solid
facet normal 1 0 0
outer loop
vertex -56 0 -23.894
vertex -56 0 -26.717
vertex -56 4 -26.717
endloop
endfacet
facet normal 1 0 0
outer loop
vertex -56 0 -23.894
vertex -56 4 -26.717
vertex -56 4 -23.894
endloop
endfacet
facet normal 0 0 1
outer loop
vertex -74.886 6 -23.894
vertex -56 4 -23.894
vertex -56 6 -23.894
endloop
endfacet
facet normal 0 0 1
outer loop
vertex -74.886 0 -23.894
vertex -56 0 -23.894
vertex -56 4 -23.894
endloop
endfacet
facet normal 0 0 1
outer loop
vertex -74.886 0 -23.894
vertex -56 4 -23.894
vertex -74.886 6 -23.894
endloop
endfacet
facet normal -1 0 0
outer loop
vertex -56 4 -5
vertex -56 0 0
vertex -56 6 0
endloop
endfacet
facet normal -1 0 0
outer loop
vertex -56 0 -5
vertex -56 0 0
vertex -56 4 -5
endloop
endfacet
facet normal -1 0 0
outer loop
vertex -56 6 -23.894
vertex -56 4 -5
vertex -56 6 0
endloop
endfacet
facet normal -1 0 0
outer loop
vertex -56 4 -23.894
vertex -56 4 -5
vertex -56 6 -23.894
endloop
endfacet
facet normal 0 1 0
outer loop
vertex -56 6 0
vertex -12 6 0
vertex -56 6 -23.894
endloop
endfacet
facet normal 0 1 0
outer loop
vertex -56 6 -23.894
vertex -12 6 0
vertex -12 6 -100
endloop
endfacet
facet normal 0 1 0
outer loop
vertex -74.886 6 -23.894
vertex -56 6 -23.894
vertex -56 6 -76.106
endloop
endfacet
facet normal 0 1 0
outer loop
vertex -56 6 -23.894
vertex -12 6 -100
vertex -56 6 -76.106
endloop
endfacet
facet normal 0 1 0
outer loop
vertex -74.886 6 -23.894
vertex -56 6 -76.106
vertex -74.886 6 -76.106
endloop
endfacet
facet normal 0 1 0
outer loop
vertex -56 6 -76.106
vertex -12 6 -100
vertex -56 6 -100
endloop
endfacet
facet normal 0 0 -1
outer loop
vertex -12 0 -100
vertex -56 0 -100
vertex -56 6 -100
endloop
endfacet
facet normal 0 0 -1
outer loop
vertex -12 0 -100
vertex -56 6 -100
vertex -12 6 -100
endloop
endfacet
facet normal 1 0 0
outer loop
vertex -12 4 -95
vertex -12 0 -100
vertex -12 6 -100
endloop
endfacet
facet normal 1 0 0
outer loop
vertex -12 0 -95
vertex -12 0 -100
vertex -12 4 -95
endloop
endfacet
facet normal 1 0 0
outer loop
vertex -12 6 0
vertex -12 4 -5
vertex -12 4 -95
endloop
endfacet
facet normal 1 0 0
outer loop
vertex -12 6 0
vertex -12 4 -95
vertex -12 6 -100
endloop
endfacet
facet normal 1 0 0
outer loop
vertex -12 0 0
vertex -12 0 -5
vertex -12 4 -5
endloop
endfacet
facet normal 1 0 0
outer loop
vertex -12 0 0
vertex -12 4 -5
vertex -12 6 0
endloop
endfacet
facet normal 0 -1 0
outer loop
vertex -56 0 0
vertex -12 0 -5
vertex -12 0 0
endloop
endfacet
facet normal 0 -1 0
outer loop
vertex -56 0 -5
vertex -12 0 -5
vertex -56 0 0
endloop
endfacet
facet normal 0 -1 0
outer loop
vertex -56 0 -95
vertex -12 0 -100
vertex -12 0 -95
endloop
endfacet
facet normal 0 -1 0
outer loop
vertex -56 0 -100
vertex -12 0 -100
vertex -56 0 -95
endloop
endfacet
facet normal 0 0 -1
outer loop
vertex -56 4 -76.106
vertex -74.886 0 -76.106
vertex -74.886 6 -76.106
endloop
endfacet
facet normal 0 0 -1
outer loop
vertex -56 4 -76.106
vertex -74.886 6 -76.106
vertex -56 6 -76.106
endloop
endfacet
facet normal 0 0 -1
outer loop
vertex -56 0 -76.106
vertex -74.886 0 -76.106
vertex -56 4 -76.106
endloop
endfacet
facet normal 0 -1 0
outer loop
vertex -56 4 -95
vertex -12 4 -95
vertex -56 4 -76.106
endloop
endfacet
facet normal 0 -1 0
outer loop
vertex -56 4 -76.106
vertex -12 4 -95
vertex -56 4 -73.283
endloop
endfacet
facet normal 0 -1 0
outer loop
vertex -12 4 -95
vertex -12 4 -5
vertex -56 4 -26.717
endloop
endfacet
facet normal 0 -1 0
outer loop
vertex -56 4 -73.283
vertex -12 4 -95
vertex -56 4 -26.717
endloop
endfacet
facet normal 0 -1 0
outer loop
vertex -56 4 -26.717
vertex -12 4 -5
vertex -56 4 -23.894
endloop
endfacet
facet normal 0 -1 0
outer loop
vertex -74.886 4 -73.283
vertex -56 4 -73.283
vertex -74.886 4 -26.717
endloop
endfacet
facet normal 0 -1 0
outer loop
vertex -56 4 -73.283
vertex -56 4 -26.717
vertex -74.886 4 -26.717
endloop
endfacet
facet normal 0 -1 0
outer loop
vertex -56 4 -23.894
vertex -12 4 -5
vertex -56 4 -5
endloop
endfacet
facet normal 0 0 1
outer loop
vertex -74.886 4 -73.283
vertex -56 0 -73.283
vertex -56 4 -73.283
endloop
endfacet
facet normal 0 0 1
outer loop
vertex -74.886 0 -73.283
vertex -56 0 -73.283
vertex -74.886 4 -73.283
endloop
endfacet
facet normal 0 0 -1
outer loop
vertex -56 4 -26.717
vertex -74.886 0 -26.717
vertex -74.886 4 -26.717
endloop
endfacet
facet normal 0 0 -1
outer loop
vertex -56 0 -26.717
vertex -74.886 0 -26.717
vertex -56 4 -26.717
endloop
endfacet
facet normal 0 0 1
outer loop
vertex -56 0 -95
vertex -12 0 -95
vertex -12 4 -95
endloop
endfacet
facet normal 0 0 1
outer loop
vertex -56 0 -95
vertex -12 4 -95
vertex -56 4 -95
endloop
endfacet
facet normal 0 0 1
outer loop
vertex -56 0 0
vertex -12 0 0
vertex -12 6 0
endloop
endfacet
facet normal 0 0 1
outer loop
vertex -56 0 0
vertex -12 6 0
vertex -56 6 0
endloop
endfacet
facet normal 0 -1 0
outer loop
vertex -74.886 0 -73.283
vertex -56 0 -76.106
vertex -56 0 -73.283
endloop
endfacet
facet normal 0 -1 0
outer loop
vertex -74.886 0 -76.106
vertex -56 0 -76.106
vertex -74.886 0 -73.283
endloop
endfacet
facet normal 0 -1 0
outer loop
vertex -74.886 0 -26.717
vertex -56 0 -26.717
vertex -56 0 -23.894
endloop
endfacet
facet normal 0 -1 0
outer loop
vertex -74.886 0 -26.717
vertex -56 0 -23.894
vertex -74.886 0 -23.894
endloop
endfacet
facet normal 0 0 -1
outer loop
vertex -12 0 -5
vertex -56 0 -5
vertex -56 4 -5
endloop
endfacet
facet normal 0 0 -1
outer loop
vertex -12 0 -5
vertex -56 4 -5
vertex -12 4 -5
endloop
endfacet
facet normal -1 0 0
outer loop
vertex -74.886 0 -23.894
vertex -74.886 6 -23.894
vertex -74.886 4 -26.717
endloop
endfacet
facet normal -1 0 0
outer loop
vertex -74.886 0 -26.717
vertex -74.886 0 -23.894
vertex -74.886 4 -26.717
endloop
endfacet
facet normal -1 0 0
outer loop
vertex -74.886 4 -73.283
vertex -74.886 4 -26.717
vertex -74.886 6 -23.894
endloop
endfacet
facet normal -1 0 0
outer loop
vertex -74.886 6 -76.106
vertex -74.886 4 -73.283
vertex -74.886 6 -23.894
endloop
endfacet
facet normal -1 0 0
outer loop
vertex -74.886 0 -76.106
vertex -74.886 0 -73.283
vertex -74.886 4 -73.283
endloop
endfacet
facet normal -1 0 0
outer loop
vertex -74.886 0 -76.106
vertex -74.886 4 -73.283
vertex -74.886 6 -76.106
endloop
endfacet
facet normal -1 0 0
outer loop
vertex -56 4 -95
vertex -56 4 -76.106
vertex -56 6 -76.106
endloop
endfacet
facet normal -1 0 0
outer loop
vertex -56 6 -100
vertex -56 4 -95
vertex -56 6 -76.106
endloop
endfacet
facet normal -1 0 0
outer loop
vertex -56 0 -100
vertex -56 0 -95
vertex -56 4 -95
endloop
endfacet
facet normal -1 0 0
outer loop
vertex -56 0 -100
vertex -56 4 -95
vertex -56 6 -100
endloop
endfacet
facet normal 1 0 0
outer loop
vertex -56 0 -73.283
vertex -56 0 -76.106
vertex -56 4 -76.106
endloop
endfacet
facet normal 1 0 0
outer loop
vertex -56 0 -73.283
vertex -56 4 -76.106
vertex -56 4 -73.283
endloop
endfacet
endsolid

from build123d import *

# Parameters (mm, degrees)
EXTRUDE_1_DEPTH     = 6
CUT_EXTRUDE_2_DEPTH = 4


with BuildPart() as part:
    # Эскиз1 → Вытянуть1 (new body)
    with BuildSketch(Plane(origin=(0, 0, 0), x_dir=(1, 0, 0), z_dir=(0, 1, 0))):
        Polygon((-12, 0), (-56, 0), (-56, 23.893685267), (-74.88648833, 23.893685267), (-74.88648833, 76.106314733), (-56, 76.106314733), (-56, 100), (-12, 100), align=None)
    extrude(amount=EXTRUDE_1_DEPTH)

    # Эскиз2 → Вытянуть2 (cut)
    with BuildSketch(Plane.XZ):
        Polygon((-56, -5), (-12, -5), (-12, -95), (-56, -95), (-56, -73.28325794), (-74.88648833, -73.28325794), (-74.88648833, -26.71674206), (-56, -26.71674206), align=None)
    extrude(amount=-CUT_EXTRUDE_2_DEPTH, mode=Mode.SUBTRACT)


solid = part.part
